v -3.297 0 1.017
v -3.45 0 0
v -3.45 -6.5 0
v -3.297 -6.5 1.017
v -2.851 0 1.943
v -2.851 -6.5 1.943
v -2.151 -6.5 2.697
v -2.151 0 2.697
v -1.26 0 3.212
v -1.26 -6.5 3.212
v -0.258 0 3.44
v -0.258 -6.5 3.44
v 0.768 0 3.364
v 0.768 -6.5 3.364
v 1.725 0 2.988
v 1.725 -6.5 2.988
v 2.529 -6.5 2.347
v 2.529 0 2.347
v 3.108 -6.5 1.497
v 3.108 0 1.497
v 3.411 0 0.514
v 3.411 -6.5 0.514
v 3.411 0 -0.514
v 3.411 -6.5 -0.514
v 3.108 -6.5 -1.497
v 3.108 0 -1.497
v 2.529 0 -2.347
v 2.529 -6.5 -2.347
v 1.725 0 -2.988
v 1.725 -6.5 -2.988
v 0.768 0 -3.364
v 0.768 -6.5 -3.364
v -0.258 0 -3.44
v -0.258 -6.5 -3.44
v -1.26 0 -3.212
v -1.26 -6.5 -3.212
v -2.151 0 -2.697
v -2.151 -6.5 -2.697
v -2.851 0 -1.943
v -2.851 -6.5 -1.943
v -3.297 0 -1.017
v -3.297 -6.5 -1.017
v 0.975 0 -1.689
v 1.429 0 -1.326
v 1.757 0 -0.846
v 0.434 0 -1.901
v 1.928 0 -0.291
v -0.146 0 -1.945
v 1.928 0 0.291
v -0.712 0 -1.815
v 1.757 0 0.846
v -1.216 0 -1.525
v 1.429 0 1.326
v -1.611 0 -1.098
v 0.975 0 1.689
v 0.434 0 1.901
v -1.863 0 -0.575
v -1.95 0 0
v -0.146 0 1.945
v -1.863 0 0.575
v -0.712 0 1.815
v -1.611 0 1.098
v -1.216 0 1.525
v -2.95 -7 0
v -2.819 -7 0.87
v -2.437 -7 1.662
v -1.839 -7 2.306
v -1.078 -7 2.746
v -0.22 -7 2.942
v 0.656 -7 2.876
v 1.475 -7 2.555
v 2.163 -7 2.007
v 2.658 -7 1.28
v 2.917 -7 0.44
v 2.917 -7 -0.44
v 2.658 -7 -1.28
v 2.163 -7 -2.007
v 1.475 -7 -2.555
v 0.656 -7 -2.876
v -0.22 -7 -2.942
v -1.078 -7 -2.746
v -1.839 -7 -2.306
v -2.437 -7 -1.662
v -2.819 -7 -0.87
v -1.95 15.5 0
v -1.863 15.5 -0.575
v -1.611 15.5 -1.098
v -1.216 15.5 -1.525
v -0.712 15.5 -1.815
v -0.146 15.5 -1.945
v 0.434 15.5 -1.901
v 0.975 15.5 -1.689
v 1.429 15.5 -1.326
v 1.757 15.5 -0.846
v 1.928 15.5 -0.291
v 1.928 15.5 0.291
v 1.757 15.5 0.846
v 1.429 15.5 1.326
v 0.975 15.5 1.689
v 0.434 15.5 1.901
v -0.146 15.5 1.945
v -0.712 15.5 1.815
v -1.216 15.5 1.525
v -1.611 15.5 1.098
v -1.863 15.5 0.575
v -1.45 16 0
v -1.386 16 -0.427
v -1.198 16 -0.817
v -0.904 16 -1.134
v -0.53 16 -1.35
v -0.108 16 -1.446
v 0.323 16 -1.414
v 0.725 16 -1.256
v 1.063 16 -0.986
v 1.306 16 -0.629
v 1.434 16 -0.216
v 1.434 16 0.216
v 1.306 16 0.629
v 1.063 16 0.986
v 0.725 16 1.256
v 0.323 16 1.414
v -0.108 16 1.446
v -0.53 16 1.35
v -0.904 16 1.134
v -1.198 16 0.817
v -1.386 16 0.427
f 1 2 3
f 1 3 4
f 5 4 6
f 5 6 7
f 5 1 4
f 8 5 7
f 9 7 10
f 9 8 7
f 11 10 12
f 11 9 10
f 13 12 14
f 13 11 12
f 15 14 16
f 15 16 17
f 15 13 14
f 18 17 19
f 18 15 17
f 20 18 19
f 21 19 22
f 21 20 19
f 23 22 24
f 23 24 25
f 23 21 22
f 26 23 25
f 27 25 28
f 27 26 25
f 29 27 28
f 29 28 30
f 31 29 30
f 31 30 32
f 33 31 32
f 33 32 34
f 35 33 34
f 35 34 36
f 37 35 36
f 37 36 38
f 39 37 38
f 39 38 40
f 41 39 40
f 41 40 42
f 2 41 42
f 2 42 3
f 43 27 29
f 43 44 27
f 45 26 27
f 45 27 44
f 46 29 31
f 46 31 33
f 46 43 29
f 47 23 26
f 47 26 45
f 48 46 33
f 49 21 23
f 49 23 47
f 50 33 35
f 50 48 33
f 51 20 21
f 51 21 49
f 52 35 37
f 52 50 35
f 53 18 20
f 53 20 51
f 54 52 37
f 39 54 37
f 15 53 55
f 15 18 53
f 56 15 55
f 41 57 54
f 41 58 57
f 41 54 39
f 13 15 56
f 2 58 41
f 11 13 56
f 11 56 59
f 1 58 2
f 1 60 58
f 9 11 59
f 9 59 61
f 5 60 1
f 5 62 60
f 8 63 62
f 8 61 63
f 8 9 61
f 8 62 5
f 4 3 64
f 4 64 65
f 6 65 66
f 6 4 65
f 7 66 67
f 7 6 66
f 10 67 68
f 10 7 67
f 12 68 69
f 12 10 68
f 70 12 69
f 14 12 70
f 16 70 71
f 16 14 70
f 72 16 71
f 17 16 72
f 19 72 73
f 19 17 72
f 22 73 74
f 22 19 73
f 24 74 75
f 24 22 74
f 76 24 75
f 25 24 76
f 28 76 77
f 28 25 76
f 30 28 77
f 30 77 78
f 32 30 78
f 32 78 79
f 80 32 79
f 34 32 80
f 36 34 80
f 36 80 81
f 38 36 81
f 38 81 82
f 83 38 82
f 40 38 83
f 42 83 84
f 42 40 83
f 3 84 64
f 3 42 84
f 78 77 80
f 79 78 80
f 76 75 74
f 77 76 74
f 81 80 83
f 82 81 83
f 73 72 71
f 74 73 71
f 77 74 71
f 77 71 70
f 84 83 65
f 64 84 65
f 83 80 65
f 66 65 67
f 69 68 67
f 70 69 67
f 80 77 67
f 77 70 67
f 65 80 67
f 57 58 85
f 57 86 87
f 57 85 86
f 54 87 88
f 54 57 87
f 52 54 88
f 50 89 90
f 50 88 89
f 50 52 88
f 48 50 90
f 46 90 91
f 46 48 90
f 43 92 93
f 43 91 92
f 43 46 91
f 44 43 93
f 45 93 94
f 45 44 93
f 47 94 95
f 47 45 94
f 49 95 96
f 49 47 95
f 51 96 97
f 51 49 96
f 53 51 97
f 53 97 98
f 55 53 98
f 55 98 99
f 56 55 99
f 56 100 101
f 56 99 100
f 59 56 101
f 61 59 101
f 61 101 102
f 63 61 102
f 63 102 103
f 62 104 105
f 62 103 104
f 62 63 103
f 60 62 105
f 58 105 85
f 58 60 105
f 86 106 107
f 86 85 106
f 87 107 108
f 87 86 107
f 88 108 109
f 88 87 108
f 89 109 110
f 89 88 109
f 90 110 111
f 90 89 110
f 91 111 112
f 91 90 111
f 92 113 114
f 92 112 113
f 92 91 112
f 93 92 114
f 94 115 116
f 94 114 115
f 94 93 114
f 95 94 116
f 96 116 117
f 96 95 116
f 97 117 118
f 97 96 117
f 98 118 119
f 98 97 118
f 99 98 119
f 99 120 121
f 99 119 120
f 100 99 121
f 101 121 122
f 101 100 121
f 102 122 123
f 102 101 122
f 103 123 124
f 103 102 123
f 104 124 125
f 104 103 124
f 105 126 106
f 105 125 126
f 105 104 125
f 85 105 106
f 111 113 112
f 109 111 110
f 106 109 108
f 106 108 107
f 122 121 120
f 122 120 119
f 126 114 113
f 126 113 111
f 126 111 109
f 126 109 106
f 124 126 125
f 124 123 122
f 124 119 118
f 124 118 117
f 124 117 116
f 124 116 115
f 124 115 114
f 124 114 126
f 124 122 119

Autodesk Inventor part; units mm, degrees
ref_plane "YZ Plane" through (0, 0, 0) normal (1, 0, 0) x (0, 1, 0)
ref_plane "XZ Plane" through (0, 0, 0) normal (0, 1, 0) x (-1, 0, 0)
ref_plane "XY Plane" through (0, 0, 0) normal (0, 0, 1) x (1, 0, 0)
sketch "Sketch1" plane through (0, 0, 0) normal (0, 1, 0) x (-1, 0, 0)
  circle A0 centre (0, 0) radius 1.95
  dimension "d0" = 3.9
extrude "Extrusion1" add sketch "Sketch1" along normal blind 16 and the other way blind 7
sketch "Sketch2" plane through (0, 0, 0) normal (0, 1, 0) x (-1, 0, 0)
  circle A0 centre (0, 0) radius 1.95 projected
  circle A1 centre (0, 0) radius 3.45
  dimension "d5" = 1.5
extrude "Extrusion2" add sketch "Sketch2" against normal blind 7
chamfer "Chamfer1" distance 0.5 angle 45 2 edges at (1.95, 16, 0) (3.45, -7, 0)
properties part number "button"
